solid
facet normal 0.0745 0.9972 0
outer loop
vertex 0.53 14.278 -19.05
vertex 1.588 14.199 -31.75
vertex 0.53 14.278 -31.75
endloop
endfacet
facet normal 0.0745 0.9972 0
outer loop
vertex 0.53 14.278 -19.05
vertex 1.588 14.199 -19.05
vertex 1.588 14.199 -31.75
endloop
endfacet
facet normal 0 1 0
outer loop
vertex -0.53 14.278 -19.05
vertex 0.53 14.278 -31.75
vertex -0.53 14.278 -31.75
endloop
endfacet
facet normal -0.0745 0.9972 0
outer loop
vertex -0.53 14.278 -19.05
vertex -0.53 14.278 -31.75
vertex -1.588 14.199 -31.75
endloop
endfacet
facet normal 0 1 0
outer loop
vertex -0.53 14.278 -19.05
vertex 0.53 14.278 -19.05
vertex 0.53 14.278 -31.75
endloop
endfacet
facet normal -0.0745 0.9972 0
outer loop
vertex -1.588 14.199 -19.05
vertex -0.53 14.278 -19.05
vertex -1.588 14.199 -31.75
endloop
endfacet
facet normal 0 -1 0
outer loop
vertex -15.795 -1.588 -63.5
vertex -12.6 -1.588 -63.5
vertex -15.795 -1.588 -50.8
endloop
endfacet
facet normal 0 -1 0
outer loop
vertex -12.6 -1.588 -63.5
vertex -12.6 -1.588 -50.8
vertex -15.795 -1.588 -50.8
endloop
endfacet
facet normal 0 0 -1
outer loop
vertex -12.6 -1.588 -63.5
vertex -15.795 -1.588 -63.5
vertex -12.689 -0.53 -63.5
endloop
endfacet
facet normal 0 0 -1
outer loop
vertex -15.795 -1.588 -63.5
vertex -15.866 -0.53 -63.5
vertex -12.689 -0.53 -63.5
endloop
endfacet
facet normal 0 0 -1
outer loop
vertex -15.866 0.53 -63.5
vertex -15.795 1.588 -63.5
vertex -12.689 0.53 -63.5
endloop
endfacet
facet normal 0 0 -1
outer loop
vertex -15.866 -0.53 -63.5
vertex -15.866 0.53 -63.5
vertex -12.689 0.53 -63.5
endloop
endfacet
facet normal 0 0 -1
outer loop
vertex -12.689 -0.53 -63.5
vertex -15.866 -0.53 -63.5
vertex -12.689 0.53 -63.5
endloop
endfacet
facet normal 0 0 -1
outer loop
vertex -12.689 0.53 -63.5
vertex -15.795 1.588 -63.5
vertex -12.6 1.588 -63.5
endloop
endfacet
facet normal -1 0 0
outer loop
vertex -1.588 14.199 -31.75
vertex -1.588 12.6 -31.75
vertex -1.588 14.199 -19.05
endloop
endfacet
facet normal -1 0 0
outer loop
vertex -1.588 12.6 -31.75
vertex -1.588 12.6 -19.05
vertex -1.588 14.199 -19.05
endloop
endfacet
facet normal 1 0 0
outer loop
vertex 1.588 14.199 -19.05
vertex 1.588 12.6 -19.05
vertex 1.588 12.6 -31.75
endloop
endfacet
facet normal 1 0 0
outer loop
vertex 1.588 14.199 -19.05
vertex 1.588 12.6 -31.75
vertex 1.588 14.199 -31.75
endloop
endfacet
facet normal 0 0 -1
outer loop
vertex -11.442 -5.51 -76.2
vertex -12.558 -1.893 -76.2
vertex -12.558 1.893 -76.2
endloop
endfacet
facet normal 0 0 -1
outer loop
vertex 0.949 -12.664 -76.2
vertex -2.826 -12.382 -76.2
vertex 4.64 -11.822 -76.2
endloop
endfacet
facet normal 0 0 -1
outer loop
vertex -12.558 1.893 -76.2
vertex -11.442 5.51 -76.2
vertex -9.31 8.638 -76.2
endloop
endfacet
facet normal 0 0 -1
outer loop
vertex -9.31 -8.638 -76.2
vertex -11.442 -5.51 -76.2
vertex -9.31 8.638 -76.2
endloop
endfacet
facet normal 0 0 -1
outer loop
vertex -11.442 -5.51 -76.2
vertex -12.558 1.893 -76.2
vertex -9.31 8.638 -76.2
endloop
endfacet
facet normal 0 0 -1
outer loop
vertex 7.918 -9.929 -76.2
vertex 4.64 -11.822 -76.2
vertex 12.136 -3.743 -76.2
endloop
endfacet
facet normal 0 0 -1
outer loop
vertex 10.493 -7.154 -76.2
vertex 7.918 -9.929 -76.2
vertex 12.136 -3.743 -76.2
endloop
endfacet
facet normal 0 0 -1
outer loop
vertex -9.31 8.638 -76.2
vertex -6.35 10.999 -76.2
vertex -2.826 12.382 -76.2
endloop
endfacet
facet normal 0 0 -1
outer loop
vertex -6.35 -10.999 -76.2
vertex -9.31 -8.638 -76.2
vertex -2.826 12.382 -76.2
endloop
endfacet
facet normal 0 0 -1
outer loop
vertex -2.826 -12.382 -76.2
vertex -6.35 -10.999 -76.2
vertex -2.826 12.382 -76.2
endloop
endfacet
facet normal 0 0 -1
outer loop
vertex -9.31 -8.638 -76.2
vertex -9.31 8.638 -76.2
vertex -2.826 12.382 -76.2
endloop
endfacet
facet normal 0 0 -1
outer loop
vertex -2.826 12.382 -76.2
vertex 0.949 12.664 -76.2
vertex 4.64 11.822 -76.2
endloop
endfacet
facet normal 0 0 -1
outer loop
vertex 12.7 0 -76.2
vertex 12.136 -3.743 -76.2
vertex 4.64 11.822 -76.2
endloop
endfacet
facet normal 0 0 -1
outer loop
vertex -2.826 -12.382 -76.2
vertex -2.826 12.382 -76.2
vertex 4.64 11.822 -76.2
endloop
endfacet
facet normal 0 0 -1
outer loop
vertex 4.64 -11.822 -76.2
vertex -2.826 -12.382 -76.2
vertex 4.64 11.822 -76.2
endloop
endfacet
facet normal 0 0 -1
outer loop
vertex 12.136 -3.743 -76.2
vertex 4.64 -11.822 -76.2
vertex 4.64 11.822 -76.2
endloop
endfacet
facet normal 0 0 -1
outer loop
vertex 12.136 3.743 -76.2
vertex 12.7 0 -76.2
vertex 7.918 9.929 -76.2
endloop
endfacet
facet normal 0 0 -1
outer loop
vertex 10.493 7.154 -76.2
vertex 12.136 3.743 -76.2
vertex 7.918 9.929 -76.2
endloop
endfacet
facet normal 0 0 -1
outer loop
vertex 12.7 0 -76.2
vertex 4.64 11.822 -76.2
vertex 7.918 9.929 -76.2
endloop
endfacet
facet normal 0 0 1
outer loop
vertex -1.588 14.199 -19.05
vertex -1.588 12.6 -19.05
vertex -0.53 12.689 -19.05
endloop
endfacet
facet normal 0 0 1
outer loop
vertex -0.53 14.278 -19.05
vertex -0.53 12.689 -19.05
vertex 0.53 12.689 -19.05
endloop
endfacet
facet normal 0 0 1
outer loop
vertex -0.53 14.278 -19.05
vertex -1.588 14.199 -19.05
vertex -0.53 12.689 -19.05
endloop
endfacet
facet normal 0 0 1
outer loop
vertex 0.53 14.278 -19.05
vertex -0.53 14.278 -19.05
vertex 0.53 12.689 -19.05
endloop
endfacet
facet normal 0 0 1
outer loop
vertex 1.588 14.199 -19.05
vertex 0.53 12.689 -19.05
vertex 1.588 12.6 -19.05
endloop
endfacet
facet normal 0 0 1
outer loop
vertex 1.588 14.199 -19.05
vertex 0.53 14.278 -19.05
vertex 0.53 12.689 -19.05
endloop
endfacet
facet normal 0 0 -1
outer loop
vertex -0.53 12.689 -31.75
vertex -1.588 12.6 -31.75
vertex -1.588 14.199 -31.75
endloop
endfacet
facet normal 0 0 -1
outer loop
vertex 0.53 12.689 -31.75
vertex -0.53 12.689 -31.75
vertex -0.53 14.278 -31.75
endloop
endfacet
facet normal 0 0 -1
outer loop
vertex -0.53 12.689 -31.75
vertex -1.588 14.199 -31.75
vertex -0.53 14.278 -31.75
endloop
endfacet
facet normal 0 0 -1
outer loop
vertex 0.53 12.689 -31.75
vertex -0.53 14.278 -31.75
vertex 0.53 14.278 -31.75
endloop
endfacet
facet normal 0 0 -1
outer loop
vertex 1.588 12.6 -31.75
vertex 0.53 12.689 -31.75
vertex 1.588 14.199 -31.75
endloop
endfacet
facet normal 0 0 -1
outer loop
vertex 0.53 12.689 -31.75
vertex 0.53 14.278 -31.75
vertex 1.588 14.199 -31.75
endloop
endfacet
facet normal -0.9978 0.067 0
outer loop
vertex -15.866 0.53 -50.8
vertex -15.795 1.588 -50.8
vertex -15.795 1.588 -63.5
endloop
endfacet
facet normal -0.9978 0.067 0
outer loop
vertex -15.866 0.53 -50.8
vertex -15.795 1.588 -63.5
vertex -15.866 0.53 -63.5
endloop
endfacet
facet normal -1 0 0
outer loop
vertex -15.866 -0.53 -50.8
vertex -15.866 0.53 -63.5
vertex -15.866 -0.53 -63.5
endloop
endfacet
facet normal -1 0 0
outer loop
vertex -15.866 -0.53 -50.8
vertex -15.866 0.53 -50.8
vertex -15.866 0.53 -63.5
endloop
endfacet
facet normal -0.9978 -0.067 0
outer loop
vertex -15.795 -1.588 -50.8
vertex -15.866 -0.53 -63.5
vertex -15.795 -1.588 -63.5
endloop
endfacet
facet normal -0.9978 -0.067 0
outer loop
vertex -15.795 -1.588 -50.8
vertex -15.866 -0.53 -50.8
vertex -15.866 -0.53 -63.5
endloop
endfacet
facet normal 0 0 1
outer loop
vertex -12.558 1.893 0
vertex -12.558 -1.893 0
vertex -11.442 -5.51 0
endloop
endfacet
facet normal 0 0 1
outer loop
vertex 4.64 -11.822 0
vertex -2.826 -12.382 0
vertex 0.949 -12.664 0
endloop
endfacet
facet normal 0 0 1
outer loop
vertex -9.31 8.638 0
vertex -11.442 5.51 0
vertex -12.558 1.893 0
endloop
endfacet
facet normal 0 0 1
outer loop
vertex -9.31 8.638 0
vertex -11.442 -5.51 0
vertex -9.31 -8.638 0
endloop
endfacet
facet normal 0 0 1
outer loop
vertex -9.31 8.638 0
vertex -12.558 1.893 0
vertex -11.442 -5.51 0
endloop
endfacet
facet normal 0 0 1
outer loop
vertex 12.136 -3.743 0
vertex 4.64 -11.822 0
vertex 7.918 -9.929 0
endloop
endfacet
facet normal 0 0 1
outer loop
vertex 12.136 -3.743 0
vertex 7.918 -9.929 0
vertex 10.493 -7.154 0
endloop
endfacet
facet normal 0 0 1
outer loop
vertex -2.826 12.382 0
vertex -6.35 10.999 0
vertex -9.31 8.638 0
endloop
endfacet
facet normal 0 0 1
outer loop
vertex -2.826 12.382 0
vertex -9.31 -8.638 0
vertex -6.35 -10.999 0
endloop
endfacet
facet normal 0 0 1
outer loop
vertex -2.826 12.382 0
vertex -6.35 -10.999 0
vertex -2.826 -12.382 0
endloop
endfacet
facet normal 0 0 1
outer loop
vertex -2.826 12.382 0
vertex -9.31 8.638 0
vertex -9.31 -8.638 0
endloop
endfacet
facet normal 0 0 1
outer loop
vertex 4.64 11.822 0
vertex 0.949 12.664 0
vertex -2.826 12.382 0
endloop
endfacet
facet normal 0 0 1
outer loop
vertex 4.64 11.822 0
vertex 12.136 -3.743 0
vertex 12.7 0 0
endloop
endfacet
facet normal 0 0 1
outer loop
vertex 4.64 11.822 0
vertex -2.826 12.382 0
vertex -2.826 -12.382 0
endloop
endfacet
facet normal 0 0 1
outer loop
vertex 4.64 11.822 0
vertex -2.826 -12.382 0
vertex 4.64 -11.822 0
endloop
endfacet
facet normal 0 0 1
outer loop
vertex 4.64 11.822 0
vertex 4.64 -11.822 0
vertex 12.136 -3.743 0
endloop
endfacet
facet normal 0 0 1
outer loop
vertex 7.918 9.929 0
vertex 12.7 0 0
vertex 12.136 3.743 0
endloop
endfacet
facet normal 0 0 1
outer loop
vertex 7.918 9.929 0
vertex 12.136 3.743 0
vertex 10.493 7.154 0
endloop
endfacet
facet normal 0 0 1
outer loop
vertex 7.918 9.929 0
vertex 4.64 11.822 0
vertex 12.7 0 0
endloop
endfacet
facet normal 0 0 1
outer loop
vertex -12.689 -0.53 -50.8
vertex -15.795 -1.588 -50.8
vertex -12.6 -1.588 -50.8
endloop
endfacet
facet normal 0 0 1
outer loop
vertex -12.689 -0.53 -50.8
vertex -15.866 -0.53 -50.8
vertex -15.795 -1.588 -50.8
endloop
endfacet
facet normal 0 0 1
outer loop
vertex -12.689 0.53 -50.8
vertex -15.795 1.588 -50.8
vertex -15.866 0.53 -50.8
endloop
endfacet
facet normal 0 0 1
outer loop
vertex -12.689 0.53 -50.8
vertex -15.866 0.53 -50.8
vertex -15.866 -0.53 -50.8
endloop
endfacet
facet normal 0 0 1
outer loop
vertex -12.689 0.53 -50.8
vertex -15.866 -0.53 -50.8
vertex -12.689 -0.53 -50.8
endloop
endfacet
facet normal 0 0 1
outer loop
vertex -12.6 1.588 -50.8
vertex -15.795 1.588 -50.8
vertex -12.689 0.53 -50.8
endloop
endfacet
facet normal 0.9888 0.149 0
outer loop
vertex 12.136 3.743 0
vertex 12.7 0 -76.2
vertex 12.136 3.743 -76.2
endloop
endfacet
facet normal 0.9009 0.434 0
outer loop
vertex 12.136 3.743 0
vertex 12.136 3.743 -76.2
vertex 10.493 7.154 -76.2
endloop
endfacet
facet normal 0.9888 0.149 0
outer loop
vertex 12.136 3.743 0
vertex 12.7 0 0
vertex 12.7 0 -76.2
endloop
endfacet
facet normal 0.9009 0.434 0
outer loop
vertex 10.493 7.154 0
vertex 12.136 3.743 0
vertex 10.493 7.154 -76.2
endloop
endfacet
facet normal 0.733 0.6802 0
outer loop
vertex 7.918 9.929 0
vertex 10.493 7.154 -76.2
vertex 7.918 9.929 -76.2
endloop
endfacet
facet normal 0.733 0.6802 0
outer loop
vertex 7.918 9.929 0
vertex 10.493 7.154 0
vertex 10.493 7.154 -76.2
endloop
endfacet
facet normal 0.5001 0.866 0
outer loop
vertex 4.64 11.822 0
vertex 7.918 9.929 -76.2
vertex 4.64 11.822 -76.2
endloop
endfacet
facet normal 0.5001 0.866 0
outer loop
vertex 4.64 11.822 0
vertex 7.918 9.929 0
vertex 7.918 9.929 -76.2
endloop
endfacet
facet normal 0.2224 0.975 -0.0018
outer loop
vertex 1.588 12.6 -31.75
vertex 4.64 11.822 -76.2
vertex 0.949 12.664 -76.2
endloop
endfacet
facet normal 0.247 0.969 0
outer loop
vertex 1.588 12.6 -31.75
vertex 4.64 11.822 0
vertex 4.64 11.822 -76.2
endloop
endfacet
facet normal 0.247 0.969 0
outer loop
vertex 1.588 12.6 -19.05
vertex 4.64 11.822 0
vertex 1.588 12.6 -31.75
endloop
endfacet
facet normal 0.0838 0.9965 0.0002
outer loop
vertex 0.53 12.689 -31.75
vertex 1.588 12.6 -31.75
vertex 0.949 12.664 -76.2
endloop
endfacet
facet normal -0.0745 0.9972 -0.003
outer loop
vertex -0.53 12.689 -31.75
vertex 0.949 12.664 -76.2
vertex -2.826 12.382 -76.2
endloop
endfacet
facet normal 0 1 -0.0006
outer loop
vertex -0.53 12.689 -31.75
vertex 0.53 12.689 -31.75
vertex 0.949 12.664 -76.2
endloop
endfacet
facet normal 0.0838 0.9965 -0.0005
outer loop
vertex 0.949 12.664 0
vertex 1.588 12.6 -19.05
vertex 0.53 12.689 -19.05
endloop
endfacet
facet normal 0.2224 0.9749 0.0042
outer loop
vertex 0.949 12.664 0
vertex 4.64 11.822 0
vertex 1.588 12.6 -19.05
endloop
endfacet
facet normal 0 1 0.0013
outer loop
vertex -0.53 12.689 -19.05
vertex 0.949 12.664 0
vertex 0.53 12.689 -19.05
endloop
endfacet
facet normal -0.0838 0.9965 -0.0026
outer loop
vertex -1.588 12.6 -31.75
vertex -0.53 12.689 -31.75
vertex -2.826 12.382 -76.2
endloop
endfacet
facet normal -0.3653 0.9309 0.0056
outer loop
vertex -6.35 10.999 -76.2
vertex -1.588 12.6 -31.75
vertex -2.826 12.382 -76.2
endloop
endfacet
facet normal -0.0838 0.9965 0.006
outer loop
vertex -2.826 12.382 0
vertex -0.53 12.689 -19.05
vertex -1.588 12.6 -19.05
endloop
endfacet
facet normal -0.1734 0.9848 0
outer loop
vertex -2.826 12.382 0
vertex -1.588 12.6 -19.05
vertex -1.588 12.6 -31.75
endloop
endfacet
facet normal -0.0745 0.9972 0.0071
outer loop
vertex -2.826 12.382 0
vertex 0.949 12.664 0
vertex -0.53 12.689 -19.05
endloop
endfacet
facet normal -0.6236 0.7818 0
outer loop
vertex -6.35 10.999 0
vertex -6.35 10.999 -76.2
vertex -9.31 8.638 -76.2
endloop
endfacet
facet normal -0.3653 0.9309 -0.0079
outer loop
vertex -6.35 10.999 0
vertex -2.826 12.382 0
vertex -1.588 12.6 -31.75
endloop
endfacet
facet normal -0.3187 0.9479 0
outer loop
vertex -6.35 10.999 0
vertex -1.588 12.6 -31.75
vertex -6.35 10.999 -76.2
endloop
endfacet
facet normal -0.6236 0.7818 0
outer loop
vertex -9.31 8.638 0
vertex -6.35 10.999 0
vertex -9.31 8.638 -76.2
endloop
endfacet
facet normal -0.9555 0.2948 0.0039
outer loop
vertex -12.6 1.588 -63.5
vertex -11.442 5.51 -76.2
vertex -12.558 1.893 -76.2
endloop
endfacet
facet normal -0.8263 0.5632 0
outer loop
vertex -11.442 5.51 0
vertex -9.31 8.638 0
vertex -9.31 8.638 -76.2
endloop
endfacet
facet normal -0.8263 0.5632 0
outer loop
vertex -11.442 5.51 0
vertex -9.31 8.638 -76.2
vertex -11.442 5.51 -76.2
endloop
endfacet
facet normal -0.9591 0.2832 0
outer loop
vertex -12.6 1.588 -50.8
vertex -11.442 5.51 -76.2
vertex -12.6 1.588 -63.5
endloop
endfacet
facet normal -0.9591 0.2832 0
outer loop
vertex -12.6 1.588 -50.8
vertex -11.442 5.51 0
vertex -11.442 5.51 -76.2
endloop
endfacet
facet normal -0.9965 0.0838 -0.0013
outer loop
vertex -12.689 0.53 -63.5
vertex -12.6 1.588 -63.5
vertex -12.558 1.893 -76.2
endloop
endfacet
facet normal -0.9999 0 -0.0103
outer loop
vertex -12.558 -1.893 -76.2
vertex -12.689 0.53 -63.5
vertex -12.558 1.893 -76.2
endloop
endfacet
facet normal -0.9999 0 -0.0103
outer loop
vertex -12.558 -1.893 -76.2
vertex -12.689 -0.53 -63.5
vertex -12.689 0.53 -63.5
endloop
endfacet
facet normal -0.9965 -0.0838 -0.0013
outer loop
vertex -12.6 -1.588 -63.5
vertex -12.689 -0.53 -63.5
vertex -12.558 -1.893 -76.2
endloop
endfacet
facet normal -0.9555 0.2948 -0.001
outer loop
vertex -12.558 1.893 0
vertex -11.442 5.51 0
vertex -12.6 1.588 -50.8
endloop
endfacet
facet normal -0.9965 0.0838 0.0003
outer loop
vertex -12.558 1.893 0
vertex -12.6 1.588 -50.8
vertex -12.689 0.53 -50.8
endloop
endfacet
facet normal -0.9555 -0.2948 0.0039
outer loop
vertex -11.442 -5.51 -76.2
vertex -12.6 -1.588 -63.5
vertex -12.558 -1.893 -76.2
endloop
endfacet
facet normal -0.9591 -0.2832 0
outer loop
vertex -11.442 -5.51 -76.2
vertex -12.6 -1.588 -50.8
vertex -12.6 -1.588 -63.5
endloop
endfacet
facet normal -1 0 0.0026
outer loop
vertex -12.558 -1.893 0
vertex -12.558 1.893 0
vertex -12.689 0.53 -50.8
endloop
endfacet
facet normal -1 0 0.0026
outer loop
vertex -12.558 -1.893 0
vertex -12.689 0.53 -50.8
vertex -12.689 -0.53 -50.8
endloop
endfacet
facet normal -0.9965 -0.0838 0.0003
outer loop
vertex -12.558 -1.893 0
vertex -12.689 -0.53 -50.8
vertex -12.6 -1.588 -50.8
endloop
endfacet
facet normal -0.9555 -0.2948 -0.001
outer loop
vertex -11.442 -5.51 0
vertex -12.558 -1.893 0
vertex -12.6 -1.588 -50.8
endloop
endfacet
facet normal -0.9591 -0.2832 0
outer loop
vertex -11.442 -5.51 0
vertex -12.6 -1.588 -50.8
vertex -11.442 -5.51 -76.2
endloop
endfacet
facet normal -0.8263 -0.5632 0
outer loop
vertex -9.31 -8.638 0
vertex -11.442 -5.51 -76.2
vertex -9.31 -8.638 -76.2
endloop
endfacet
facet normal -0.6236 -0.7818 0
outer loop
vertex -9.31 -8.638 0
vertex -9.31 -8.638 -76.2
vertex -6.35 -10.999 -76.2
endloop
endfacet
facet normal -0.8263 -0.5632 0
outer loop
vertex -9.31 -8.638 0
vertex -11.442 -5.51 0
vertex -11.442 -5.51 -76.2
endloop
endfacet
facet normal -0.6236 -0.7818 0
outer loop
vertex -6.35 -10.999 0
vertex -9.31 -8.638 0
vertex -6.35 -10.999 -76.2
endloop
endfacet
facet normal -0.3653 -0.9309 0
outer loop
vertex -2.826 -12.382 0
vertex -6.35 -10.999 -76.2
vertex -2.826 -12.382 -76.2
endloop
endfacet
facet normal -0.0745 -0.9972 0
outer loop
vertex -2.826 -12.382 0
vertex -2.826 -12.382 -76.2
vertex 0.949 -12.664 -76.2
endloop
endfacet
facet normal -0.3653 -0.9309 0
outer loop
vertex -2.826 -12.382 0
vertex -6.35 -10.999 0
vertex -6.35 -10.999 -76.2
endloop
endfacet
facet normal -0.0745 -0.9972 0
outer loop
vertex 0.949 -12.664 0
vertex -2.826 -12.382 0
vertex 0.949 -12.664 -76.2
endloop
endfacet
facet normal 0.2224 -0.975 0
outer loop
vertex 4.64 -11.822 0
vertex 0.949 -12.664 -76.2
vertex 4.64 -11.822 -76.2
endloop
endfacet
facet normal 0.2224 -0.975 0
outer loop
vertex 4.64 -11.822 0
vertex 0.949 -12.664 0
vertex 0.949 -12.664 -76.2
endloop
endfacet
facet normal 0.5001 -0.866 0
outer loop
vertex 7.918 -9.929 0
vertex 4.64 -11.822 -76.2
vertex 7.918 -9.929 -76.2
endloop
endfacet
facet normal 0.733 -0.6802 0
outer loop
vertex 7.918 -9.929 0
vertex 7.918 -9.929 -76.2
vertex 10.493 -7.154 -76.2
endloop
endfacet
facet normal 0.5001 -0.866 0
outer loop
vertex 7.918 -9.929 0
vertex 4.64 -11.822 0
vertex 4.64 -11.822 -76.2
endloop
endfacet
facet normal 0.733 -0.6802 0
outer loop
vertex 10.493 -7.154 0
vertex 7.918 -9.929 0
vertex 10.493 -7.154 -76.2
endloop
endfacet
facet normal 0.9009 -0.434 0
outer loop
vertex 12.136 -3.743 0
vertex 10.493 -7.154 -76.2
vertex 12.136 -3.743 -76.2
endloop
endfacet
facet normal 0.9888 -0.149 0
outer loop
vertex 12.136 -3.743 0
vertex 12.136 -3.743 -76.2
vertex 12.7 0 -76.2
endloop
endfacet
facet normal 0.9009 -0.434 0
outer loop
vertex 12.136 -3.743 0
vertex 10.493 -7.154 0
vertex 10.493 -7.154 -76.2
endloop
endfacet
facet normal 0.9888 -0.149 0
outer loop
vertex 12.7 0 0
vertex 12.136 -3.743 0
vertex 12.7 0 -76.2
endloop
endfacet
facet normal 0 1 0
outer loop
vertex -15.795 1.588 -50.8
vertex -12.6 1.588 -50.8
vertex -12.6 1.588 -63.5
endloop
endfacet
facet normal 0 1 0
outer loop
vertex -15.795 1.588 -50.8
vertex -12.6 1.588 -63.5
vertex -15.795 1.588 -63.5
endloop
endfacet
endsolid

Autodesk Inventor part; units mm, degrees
ref_plane "YZ Plane" through (0, 0, 0) normal (1, 0, 0) x (0, 1, 0)
ref_plane "XZ Plane" through (0, 0, 0) normal (0, 1, 0) x (-1, 0, 0)
ref_plane "XY Plane" through (0, 0, 0) normal (0, 0, 1) x (1, 0, 0)
sketch "Sketch1" plane through (0, 0, 0) normal (0, 0, 1) x (1, 0, 0)
  circle A0 centre (0, 0) radius 12.7
  dimension "d0" = 25.4
extrude "Extrusion1" add sketch "Sketch1" against normal blind 76.2
ref_plane "WorkPlaneForFirstKeys" through (0, 0, -19.05) normal (0, 0, 1) x (1, 0, 0)
sketch "Sketch3" plane through (0, 0, -19.05) normal (0, 0, 1) x (1, 0, 0)
  circle A0 centre (0, 0) radius 12.7 projected
  arc A1 (1.5875, 14.199) -> (-1.5875, 14.199) centre (0, 0) ccw
  arc A2 (1.5875, 12.6004) -> (-1.5875, 12.6004) centre (0, 0) ccw
  line L0 (-1.5875, 12.6004) -> (-1.5875, 14.199)
  line L1 (1.5875, 12.6004) -> (1.5875, 14.199)
  line L2 (0, 0) -> (0, 14.2875) construction
  point P0 (-1.5875, 12.6004)
  point P1 (1.5875, 12.6004)
  dimension "d4" = 28.575
  dimension "d6" = 1.5875
  dimension "d7" = 1.5875
extrude "Extrusion2" add sketch "Sketch3" against normal blind 12.7 contours A0 L0 A1 L1
ref_plane "WorkPlaneForSecondKeys" through (0, 0, -50.8) normal (0, 0, 1) x (1, 0, 0)
sketch "Sketch4" plane through (0, 0, -50.8) normal (0, 0, 1) x (1, 0, 0)
  arc A0 (-15.7954, 1.5875) -> (-15.7954, -1.5875) centre (0, 0) ccw
  arc A1 (-12.6004, 1.5875) -> (-12.6004, -1.5875) centre (0, 0) ccw
  line L0 (0, 0) -> (-15.875, 0) construction
  circle A2 centre (0, 0) radius 12.7 projected
  line L1 (-12.6004, -1.5875) -> (-15.7954, -1.5875)
  line L2 (-12.6004, 1.5875) -> (-15.7954, 1.5875)
  dimension "d11" = 31.75
  dimension "d12" = 1.5875
  dimension "d13" = 1.5875
extrude "Extrusion3" add sketch "Sketch4" against normal blind 12.7 contours L2 A1 L1 A0
properties part number "clutch03Shaft"
